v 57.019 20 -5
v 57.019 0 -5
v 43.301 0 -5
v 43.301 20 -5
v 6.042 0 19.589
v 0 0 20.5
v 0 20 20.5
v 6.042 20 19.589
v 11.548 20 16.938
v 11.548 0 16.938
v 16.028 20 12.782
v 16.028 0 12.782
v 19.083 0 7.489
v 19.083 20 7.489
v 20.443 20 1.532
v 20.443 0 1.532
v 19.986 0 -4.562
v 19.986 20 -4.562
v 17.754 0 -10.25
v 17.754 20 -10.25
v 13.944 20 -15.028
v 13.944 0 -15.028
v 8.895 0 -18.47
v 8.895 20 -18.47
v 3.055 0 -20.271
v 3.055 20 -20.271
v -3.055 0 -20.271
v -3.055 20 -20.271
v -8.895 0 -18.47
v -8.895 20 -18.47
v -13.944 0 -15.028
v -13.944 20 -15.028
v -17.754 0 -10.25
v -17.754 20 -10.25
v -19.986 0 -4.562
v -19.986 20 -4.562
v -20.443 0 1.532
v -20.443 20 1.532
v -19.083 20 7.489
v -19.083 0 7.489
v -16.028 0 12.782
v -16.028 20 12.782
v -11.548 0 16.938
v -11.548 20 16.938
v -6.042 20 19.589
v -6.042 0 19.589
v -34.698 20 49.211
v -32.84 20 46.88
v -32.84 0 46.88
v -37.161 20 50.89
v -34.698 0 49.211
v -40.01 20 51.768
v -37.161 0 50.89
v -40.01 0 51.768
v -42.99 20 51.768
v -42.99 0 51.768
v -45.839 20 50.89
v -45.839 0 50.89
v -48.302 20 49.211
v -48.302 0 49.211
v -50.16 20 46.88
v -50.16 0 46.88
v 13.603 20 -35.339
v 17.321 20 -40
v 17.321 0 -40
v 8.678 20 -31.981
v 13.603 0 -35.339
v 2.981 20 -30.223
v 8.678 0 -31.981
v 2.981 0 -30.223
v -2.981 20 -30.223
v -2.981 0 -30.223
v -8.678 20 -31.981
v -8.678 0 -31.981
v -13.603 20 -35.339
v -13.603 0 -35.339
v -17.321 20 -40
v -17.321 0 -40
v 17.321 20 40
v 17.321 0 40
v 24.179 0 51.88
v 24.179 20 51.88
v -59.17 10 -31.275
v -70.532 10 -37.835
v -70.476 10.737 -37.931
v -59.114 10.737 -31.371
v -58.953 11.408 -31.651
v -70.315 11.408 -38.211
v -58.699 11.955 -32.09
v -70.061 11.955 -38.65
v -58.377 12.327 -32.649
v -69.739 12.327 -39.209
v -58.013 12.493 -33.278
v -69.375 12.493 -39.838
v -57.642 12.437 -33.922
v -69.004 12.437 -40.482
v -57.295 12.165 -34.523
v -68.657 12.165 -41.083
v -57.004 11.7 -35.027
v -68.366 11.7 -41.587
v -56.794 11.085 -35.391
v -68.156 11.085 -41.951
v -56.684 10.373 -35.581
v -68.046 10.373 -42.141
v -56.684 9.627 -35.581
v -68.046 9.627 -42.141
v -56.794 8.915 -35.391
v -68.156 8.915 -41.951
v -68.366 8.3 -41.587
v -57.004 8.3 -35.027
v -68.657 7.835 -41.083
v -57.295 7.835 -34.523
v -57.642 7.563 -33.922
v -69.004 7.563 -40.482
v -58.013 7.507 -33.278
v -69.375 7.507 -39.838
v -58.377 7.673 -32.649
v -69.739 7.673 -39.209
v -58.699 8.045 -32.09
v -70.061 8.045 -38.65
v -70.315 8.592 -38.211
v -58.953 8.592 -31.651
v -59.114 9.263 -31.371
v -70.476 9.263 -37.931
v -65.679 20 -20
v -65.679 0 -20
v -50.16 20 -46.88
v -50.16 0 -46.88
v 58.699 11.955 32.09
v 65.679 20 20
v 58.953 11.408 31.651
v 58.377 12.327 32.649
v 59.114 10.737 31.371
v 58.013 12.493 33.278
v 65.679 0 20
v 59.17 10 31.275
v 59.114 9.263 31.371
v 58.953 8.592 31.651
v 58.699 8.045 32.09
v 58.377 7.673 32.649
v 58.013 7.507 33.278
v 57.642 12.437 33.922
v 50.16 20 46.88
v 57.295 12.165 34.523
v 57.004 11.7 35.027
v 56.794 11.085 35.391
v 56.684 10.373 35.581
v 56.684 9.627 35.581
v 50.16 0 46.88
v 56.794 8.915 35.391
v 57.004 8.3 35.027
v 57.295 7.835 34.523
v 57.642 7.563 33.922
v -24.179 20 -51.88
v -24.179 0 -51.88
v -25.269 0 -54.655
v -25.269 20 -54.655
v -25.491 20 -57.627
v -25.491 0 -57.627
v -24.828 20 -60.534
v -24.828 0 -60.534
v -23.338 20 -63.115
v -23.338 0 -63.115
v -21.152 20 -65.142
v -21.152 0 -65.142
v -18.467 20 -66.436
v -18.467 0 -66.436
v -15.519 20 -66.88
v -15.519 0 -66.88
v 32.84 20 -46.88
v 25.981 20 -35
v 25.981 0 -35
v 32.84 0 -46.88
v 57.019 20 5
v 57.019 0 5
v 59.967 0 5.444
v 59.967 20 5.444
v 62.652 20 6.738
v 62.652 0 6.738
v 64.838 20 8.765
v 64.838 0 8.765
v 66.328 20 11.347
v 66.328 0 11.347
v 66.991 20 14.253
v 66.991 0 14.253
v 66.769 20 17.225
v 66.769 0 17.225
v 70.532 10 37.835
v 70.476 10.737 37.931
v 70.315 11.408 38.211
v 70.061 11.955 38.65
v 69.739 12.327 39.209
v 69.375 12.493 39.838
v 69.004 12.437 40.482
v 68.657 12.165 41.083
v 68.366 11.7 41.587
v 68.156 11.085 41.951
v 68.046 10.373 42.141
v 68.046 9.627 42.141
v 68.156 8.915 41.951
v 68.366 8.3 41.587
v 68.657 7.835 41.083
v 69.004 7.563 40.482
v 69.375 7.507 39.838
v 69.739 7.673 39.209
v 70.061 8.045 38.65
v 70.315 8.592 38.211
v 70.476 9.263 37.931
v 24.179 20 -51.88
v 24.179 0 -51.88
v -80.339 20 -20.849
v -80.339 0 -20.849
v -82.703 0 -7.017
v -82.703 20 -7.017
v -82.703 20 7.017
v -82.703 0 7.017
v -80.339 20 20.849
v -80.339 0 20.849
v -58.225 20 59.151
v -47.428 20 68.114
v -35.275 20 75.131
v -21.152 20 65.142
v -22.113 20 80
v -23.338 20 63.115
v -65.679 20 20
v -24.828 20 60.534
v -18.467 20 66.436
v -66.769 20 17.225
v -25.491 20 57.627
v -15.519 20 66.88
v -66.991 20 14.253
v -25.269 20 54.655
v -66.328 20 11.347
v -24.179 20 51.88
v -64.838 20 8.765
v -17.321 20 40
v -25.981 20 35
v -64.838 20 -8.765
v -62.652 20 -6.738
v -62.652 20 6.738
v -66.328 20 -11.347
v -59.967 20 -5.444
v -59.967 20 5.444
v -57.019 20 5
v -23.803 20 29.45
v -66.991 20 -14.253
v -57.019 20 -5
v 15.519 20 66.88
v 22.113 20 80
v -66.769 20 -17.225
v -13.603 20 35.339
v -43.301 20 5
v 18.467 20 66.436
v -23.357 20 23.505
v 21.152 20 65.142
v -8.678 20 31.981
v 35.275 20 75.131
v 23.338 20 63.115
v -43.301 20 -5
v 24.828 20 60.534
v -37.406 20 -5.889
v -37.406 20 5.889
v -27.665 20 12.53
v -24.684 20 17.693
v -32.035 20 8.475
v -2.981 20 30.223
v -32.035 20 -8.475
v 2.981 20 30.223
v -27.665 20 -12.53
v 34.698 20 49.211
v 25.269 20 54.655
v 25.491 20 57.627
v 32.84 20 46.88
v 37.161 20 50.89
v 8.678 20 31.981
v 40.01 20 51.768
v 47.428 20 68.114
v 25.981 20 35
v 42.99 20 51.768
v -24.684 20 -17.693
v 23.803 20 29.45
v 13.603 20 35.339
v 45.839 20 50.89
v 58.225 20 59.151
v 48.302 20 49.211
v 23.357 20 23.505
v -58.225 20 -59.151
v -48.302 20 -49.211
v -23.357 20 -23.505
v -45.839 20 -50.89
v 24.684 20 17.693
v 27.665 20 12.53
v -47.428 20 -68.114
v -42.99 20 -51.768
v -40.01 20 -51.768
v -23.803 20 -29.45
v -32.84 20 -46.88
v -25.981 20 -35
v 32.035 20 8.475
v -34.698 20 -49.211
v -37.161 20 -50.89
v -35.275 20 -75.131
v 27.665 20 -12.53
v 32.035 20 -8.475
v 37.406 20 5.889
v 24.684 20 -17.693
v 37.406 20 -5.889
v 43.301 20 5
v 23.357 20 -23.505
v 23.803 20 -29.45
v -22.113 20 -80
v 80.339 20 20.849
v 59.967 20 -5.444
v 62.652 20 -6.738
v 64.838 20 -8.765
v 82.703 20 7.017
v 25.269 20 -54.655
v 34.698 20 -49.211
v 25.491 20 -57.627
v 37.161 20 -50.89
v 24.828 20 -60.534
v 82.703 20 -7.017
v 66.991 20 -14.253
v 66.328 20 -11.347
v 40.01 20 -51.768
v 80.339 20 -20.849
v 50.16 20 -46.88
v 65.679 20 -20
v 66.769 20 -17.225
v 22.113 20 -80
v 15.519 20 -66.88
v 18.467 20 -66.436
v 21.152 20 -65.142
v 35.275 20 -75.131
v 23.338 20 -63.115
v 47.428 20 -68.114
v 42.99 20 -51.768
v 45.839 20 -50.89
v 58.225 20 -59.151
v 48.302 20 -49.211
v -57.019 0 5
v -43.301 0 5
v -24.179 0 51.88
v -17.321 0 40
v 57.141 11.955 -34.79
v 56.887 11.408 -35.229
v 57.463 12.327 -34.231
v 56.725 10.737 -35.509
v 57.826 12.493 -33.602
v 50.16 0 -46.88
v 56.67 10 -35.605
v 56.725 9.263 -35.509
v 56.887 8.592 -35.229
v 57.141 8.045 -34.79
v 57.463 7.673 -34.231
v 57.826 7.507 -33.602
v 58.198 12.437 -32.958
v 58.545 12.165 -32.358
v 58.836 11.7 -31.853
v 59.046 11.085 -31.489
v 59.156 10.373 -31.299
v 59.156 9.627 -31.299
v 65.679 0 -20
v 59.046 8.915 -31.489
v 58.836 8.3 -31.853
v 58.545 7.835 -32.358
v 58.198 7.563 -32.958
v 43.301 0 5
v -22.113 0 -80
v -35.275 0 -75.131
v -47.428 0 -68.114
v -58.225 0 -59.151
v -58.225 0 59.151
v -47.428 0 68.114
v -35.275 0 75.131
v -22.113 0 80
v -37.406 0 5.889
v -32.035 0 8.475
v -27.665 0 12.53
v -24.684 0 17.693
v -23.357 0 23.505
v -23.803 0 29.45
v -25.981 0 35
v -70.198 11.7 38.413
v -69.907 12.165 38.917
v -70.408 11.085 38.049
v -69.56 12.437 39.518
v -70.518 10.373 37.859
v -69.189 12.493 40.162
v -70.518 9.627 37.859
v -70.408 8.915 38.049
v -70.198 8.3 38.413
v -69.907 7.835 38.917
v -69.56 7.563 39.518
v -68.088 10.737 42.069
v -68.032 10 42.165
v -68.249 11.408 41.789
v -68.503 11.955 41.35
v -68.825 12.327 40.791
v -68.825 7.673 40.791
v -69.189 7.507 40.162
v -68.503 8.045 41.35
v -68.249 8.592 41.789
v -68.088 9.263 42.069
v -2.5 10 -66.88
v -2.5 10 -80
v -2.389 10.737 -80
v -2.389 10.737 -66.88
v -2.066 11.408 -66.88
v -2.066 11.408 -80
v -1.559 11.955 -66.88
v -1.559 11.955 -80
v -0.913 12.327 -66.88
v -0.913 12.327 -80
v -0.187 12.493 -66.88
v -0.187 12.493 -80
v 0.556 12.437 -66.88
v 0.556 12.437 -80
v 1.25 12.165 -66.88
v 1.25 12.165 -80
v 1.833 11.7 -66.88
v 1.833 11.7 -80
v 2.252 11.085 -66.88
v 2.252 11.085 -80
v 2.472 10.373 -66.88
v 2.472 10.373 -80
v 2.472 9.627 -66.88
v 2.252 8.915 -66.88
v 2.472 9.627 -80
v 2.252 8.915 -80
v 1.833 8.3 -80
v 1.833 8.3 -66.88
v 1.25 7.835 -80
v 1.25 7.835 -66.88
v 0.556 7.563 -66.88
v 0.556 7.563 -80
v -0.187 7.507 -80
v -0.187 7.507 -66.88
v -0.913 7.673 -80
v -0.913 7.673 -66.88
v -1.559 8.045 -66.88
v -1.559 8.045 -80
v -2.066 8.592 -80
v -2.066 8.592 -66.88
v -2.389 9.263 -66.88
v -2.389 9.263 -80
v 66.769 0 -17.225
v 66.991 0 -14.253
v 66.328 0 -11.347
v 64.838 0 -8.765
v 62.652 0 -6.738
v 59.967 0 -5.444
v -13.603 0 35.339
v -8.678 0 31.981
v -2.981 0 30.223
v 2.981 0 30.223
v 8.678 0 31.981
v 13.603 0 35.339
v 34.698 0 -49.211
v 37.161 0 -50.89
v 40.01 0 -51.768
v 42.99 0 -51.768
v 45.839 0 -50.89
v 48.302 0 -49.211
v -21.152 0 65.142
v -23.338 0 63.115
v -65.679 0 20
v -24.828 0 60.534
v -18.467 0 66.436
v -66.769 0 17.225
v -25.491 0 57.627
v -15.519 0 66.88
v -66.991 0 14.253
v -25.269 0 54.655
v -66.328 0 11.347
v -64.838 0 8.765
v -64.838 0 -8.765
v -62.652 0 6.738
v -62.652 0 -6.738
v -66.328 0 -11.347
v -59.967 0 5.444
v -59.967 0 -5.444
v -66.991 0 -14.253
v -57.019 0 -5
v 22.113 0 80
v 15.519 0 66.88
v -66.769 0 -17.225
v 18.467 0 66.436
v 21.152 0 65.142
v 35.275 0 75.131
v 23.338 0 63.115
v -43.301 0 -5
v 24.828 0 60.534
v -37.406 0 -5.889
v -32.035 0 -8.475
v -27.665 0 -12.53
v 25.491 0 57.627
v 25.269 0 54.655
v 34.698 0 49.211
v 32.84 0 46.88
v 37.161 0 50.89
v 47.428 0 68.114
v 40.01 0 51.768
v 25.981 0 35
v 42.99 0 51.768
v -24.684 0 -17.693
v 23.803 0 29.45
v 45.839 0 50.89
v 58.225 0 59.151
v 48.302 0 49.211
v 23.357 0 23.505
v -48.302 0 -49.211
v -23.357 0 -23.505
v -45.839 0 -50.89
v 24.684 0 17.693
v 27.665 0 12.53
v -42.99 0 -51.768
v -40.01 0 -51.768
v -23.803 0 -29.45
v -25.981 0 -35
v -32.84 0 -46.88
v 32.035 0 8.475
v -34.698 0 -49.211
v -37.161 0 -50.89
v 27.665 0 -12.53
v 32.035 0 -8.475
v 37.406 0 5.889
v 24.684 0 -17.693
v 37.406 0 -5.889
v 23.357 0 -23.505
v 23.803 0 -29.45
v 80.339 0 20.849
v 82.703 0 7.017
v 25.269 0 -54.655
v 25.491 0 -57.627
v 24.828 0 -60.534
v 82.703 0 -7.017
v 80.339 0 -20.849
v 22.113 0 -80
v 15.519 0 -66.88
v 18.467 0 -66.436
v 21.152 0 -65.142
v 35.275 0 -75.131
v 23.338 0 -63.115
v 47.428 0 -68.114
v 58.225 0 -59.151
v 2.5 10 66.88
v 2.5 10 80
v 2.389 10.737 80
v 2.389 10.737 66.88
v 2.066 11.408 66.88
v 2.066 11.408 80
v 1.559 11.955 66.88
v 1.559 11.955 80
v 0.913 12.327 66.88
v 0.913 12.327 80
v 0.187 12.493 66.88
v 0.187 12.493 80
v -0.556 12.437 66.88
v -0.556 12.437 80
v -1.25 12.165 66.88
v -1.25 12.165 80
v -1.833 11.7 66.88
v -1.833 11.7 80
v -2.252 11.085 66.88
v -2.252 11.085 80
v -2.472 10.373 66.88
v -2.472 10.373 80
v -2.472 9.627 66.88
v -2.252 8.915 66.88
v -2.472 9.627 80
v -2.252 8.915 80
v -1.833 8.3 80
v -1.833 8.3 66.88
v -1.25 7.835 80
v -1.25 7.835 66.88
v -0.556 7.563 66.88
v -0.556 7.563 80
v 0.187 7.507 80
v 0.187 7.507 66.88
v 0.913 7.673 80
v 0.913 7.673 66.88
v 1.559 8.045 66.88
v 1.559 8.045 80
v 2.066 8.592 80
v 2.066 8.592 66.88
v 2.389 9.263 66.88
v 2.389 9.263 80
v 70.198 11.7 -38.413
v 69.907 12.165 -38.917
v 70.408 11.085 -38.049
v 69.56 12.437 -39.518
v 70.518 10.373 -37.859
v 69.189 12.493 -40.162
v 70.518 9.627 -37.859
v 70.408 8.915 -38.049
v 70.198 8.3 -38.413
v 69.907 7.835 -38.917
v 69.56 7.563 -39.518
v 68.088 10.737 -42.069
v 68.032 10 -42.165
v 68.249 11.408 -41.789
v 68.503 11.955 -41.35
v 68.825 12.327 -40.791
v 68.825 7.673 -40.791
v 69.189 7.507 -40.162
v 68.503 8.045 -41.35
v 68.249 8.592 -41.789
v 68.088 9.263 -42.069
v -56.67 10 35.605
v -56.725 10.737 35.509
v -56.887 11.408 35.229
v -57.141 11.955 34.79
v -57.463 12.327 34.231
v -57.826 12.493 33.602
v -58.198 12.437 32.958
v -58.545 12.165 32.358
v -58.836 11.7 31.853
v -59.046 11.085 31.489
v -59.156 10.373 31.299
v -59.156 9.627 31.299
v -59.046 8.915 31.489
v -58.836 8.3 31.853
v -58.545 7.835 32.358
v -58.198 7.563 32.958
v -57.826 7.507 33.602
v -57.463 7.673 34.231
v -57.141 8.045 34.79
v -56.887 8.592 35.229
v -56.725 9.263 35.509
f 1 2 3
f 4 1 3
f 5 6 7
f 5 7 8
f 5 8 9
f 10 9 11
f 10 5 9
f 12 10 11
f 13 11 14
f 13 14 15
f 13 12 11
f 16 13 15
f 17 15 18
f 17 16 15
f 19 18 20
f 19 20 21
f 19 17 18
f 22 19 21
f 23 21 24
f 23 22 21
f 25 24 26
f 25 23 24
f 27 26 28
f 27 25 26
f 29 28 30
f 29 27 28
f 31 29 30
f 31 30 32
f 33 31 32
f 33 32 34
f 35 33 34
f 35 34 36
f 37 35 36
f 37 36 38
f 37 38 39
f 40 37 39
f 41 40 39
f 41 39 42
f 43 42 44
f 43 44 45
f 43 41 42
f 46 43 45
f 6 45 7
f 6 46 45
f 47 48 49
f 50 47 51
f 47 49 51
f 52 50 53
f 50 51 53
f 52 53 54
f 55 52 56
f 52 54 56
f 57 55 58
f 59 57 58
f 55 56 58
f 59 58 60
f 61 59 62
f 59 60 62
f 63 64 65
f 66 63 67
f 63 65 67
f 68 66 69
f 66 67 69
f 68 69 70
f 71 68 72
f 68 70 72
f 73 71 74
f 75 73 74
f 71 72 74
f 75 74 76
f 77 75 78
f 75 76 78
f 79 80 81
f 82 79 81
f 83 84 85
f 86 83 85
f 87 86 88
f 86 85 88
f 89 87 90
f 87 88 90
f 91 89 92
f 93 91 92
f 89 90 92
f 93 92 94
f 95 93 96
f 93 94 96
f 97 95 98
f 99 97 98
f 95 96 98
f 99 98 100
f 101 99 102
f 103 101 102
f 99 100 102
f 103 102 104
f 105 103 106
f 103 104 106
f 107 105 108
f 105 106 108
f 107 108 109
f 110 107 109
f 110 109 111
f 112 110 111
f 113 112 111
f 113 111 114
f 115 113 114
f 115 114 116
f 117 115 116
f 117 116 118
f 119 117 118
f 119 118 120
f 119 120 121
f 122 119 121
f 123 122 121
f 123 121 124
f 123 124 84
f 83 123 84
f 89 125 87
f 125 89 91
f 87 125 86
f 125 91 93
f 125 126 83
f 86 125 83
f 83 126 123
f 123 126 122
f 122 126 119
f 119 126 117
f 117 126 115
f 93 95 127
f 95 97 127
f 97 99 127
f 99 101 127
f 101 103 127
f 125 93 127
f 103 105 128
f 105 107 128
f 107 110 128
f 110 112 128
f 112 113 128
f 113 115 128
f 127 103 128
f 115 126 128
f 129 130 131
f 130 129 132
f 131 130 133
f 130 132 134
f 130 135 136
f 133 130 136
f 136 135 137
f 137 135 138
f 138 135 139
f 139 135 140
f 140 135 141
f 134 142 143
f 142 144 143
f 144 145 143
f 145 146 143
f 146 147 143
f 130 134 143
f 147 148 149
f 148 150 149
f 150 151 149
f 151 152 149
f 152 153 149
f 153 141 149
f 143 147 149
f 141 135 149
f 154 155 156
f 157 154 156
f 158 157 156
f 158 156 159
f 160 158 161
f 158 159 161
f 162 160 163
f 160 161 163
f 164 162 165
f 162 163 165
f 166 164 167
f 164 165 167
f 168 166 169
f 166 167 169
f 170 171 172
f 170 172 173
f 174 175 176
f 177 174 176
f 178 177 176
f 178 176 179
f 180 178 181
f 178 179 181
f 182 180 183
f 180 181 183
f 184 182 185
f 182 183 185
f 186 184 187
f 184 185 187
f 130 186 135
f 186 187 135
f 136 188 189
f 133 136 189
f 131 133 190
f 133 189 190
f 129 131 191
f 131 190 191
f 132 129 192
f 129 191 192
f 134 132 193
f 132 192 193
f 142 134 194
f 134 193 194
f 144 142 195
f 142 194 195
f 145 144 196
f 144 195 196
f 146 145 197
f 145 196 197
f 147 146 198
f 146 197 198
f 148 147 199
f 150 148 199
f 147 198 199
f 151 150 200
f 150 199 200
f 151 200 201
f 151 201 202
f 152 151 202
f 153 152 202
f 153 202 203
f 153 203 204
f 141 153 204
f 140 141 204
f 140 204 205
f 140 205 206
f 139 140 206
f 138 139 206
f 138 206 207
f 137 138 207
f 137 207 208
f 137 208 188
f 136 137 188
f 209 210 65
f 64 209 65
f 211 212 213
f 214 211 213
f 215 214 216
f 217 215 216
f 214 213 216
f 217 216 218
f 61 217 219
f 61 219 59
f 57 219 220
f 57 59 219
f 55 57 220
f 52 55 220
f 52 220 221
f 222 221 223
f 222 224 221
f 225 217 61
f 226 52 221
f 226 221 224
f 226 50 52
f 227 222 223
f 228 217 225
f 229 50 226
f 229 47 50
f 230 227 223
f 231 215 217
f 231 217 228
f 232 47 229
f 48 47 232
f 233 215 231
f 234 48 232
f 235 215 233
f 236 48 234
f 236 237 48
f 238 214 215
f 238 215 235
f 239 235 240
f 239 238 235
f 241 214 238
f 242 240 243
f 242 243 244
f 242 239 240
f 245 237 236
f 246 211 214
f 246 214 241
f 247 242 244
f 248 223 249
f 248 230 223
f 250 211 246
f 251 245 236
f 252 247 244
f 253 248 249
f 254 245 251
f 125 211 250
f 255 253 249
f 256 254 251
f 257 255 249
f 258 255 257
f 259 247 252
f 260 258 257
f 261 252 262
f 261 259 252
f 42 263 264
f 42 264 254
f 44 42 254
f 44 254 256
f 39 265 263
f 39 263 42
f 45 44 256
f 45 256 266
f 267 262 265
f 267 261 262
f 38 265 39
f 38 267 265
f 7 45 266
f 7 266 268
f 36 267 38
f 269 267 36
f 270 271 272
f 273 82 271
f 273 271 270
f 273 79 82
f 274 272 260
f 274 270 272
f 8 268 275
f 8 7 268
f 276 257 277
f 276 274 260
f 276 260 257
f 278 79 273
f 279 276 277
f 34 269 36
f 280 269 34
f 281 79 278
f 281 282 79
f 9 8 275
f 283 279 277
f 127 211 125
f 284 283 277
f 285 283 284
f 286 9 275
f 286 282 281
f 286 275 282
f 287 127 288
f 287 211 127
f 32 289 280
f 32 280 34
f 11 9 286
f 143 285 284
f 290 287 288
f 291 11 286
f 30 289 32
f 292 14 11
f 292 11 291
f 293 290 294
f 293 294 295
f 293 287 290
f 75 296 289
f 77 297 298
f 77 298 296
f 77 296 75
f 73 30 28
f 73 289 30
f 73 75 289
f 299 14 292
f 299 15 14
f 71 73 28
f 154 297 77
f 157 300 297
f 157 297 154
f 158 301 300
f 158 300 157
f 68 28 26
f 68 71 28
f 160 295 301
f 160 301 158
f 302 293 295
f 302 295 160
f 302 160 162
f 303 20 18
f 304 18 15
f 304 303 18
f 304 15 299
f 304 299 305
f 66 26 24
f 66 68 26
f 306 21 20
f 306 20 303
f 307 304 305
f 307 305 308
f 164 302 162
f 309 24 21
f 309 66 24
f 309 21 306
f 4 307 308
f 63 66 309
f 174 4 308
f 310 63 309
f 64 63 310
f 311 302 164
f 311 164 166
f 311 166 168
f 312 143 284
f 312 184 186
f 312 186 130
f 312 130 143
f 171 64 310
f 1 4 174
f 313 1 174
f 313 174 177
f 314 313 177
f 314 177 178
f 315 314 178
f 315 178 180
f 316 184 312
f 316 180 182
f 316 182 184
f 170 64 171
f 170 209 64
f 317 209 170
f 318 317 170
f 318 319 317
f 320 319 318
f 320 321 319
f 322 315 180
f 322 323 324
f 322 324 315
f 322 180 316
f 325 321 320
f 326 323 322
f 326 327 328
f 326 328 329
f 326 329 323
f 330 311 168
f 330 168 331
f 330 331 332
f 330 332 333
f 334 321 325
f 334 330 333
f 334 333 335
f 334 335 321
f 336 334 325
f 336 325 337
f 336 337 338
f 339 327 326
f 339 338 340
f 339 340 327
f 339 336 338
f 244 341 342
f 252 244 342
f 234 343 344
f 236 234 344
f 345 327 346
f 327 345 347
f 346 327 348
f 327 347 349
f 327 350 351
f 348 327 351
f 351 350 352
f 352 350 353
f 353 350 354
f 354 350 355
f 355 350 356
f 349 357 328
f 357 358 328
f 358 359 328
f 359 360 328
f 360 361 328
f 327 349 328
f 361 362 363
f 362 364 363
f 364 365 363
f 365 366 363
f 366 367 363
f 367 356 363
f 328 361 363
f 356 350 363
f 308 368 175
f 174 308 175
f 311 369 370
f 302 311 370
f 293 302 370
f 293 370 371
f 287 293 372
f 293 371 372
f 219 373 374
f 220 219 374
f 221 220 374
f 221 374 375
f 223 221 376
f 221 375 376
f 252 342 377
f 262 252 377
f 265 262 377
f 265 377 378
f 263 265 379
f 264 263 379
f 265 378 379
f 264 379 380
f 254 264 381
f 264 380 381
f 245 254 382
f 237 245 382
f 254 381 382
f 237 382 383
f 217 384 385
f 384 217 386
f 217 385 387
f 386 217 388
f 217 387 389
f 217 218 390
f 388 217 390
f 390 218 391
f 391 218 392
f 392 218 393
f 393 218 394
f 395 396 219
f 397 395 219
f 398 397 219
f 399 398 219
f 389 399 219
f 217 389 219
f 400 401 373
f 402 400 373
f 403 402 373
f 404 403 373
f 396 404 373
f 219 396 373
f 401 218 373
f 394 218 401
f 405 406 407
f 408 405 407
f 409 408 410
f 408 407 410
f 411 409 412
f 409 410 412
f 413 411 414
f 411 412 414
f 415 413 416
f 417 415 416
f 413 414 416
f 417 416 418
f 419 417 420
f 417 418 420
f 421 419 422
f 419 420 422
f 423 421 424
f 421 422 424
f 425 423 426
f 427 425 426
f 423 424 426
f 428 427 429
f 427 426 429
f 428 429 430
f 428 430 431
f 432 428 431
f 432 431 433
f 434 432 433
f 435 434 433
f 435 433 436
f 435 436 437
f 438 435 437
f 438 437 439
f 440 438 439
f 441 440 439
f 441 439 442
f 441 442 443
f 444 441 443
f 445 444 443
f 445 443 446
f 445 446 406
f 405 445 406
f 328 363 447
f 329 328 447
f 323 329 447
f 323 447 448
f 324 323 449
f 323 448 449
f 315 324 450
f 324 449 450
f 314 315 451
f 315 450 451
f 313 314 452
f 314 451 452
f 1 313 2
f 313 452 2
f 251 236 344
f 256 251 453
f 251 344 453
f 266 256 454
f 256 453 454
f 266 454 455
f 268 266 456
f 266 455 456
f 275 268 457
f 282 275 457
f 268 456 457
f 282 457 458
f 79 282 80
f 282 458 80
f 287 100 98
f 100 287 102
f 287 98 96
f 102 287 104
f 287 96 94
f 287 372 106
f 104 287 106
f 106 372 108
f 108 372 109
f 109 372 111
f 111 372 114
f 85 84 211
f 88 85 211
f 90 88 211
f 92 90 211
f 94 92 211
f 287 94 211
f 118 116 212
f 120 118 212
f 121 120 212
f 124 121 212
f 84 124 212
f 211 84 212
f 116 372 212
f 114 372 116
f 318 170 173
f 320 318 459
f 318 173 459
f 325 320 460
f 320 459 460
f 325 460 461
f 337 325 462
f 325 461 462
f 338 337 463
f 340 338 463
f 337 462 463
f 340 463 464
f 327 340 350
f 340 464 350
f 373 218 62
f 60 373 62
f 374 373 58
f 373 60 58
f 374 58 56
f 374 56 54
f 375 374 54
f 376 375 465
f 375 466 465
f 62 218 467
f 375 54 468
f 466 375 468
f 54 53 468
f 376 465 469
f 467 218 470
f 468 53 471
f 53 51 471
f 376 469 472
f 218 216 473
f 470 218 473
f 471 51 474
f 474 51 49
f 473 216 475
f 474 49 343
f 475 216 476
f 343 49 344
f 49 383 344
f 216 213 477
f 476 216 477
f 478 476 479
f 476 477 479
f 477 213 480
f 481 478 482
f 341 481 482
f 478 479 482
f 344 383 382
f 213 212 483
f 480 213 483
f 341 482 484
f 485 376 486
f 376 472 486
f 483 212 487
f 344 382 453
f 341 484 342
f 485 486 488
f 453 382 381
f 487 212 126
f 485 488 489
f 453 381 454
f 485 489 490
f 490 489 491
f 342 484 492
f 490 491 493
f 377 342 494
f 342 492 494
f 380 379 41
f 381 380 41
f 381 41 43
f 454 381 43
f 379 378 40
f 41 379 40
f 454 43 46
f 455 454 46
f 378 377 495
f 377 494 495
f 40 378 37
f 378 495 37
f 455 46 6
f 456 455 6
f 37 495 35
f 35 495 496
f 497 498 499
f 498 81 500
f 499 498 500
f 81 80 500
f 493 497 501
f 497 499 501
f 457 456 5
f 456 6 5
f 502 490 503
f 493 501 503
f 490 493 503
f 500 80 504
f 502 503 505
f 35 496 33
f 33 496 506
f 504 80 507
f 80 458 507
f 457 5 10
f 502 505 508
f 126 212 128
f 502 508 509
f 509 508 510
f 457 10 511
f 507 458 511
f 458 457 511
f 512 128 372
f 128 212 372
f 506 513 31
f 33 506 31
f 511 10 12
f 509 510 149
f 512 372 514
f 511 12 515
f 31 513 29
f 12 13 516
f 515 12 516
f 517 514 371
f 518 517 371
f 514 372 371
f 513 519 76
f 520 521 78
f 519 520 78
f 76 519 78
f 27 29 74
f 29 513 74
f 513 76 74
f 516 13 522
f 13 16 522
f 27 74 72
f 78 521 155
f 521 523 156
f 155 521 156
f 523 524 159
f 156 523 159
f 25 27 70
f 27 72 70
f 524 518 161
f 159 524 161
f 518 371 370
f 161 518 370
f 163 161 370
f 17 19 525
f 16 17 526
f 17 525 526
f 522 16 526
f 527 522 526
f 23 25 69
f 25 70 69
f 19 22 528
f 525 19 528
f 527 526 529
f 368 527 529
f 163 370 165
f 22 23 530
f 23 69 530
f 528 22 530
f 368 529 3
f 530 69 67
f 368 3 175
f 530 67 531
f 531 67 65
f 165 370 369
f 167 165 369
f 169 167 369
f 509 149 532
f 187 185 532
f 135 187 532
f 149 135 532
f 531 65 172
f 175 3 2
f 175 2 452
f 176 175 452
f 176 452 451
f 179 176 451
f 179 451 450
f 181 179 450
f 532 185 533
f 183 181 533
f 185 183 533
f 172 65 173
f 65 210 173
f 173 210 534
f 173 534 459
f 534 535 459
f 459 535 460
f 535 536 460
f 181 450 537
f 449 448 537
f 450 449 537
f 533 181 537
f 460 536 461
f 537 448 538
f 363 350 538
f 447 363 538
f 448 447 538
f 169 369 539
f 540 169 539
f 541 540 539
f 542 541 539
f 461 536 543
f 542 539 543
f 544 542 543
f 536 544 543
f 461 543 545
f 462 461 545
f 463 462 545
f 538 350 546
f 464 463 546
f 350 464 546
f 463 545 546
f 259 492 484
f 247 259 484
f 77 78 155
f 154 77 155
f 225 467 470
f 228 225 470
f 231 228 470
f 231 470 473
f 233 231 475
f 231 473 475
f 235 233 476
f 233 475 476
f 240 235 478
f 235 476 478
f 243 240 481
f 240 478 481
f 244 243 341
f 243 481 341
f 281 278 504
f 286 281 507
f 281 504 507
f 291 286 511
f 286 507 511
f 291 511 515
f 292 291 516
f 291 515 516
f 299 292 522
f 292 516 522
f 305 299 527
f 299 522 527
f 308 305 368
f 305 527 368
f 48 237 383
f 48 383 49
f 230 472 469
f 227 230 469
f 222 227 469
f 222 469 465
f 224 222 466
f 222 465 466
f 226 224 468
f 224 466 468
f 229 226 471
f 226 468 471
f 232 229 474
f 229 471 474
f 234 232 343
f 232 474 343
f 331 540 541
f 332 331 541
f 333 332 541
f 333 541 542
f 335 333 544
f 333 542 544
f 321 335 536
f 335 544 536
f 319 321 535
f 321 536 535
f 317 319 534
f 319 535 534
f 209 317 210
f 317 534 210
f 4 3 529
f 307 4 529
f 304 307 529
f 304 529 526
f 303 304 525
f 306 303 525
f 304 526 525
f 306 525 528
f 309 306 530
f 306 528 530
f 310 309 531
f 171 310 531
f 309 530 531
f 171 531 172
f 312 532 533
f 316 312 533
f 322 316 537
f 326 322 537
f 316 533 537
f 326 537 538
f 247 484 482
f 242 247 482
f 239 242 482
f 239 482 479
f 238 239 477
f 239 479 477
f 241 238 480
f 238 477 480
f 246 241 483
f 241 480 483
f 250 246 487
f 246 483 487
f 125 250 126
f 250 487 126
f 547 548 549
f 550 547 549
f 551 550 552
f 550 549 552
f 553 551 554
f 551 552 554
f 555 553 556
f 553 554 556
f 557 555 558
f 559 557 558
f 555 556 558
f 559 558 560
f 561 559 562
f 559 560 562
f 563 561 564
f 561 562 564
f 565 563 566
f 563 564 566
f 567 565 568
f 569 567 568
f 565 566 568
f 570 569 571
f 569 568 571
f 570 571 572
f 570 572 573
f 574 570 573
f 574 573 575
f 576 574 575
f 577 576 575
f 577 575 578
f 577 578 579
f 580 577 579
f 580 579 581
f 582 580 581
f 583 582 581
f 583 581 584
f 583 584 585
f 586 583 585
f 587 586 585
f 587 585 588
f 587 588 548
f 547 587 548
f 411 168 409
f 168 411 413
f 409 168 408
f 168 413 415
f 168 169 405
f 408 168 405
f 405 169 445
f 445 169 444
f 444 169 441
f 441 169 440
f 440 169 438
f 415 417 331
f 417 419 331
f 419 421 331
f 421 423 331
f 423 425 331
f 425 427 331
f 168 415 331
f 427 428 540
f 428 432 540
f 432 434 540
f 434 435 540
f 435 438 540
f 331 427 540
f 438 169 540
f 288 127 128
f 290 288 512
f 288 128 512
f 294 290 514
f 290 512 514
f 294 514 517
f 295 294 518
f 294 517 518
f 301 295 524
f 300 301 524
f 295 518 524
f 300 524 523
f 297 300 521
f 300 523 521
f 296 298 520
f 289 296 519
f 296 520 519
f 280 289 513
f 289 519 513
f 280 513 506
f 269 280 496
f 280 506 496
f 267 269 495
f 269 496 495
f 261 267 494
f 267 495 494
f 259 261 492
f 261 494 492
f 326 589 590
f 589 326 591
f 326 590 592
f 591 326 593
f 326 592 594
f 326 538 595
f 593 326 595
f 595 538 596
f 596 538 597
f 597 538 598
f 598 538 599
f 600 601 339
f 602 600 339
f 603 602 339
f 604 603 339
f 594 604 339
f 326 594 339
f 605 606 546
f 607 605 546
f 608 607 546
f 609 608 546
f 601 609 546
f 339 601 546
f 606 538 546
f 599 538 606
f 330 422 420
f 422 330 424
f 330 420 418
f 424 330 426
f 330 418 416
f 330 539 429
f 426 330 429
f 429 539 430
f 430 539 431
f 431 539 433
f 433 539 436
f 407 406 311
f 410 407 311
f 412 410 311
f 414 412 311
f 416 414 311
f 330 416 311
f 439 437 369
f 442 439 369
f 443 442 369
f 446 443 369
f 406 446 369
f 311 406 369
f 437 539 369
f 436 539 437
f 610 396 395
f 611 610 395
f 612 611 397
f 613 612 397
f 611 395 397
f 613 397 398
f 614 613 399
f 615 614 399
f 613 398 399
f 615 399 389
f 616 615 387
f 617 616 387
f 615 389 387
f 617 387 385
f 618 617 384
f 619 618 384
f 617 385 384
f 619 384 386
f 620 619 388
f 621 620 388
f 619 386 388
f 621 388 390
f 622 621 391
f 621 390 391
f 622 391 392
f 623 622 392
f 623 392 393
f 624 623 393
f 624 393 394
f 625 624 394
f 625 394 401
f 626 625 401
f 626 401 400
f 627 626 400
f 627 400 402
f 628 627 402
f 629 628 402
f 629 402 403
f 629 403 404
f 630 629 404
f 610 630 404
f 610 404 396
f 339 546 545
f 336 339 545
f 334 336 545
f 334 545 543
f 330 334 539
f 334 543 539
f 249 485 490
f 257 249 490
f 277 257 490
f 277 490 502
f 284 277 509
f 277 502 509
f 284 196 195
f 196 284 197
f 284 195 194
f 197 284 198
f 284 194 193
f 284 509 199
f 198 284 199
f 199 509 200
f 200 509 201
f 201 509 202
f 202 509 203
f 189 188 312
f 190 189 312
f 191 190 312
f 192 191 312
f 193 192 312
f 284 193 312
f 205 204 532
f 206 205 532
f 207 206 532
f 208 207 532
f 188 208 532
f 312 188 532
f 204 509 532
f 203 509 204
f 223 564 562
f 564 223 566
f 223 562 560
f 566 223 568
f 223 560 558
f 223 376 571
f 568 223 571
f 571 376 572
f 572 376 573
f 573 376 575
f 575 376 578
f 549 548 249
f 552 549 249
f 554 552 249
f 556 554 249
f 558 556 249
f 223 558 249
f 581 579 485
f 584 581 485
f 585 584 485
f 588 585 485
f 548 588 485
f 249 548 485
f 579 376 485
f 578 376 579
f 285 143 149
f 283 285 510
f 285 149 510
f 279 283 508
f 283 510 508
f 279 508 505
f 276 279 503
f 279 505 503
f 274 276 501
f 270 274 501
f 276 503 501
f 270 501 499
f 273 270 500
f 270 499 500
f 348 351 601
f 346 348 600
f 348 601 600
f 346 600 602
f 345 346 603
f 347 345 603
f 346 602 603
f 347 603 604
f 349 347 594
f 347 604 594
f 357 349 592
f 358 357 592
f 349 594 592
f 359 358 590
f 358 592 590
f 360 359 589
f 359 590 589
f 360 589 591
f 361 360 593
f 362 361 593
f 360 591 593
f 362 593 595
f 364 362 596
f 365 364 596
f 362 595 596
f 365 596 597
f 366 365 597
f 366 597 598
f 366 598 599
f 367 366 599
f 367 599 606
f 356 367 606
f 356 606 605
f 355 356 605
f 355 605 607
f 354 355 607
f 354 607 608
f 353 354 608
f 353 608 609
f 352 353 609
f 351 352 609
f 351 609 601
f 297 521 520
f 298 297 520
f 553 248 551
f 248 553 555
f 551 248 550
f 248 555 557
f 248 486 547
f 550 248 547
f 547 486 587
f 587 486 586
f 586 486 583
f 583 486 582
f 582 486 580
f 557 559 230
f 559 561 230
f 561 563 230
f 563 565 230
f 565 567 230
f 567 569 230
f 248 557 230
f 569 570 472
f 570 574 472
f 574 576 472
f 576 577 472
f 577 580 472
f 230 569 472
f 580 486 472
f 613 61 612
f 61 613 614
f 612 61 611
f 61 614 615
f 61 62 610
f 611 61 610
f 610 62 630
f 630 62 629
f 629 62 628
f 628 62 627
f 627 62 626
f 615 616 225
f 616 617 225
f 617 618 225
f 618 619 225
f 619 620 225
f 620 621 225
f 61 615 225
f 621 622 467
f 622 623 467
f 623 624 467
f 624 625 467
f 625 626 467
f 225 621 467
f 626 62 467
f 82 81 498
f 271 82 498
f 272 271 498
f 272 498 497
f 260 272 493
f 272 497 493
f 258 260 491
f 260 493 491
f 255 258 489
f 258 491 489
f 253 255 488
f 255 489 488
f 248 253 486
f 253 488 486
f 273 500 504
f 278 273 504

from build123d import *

# Parameters (mm, degrees)
SKETCH2_R           = 20.5
BOSS_EXTRUDE1_DEPTH = 20
SKETCH3_R           = 2.5
CUT_EXTRUDE1_DEPTH  = 20
CIRPATTERN1_COUNT   = 6


with BuildPart() as part:
    # Sketch2 → Boss-Extrude1 (new body)
    with BuildSketch(Plane(origin=(0, 0, 0), x_dir=(1, 0, 0), z_dir=(0, 1, 0))):
        with BuildLine():
            Line((22.113344387, 80), (-22.113344387, 80))
            ThreePointArc((-22.113344387, 80), (-41.5, 71.880108514), (-58.225360109, 59.150718002))
            Line((-58.225360109, 59.150718002), (-80.338704497, 20.849281998))
            ThreePointArc((-80.338704497, 20.849281998), (-83, 0), (-80.338704497, -20.849281998))
            Line((-80.338704497, -20.849281998), (-58.225360109, -59.150718002))
            ThreePointArc((-58.225360109, -59.150718002), (-41.5, -71.880108514), (-22.113344387, -80))
            Line((-22.113344387, -80), (22.113344387, -80))
            ThreePointArc((22.113344387, -80), (41.5, -71.880108514), (58.225360109, -59.150718002))
            Line((58.225360109, -59.150718002), (80.338704497, -20.849281998))
            ThreePointArc((80.338704497, -20.849281998), (83, 0), (80.338704497, 20.849281998))
            Line((80.338704497, 20.849281998), (58.225360109, 59.150718002))
            ThreePointArc((58.225360109, 59.150718002), (41.5, 71.880108514), (22.113344387, 80))
        make_face()
        with Locations(Location((0, 0, 0), (0, 0, 270))):
            Circle(SKETCH2_R, mode=Mode.SUBTRACT)
        with BuildLine():
            Line((-15.519237886, 66.880108514), (15.519237886, 66.880108514))
            ThreePointArc((15.519237886, 66.880108514), (24.179491924, 61.880108514), (24.179491924, 51.880108514))
            Line((24.179491924, 51.880108514), (17.320508076, 40))
            ThreePointArc((17.320508076, 40), (0, 30), (-17.320508076, 40))
            Line((-17.320508076, 40), (-24.179491924, 51.880108514))
            ThreePointArc((-24.179491924, 51.880108514), (-24.179491924, 61.880108514), (-15.519237886, 66.880108514))
        make_face(mode=Mode.SUBTRACT)
        with BuildLine():
            Line((50.160254038, 46.880108514), (65.679491924, 20))
            ThreePointArc((65.679491924, 20), (65.679491924, 10), (57.019237886, 5))
            Line((57.019237886, 5), (43.301270189, 5))
            ThreePointArc((43.301270189, 5), (25.980762114, 15), (25.980762114, 35))
            Line((25.980762114, 35), (32.839745962, 46.880108514))
            ThreePointArc((32.839745962, 46.880108514), (41.5, 51.880108514), (50.160254038, 46.880108514))
        make_face(mode=Mode.SUBTRACT)
        with BuildLine():
            Line((65.679491924, -20), (50.160254038, -46.880108514))
            ThreePointArc((50.160254038, -46.880108514), (41.5, -51.880108514), (32.839745962, -46.880108514))
            Line((32.839745962, -46.880108514), (25.980762114, -35))
            ThreePointArc((25.980762114, -35), (25.980762114, -15), (43.301270189, -5))
            Line((43.301270189, -5), (57.019237886, -5))
            ThreePointArc((57.019237886, -5), (65.679491924, -10), (65.679491924, -20))
        make_face(mode=Mode.SUBTRACT)
        with BuildLine():
            Line((15.519237886, -66.880108514), (-15.519237886, -66.880108514))
            ThreePointArc((-15.519237886, -66.880108514), (-24.179491924, -61.880108514), (-24.179491924, -51.880108514))
            Line((-24.179491924, -51.880108514), (-17.320508076, -40))
            ThreePointArc((-17.320508076, -40), (0, -30), (17.320508076, -40))
            Line((17.320508076, -40), (24.179491924, -51.880108514))
            ThreePointArc((24.179491924, -51.880108514), (24.179491924, -61.880108514), (15.519237886, -66.880108514))
        make_face(mode=Mode.SUBTRACT)
        with BuildLine():
            Line((-50.160254038, -46.880108514), (-65.679491924, -20))
            ThreePointArc((-65.679491924, -20), (-65.679491924, -10), (-57.019237886, -5))
            Line((-57.019237886, -5), (-43.301270189, -5))
            ThreePointArc((-43.301270189, -5), (-25.980762114, -15), (-25.980762114, -35))
            Line((-25.980762114, -35), (-32.839745962, -46.880108514))
            ThreePointArc((-32.839745962, -46.880108514), (-41.5, -51.880108514), (-50.160254038, -46.880108514))
        make_face(mode=Mode.SUBTRACT)
        with BuildLine():
            Line((-65.679491924, 20), (-50.160254038, 46.880108514))
            ThreePointArc((-50.160254038, 46.880108514), (-41.5, 51.880108514), (-32.839745962, 46.880108514))
            Line((-32.839745962, 46.880108514), (-25.980762114, 35))
            ThreePointArc((-25.980762114, 35), (-25.980762114, 15), (-43.301270189, 5))
            Line((-43.301270189, 5), (-57.019237886, 5))
            ThreePointArc((-57.019237886, 5), (-65.679491924, 10), (-65.679491924, 20))
        make_face(mode=Mode.SUBTRACT)
    extrude(amount=BOSS_EXTRUDE1_DEPTH)

    # Sketch3 → Cut-Extrude1 (cut)
    with BuildSketch(Plane.XY.offset(80)):
        with Locations((0, 10)):
            Circle(SKETCH3_R)
    cut_extrude1 = extrude(amount=-CUT_EXTRUDE1_DEPTH, mode=Mode.SUBTRACT)

    # CirPattern1: Cut-Extrude1 ×6 about axis
    cirpattern1_axis = Axis((0, 20, 0), (0, 1, 0))
    for i in range(1, CIRPATTERN1_COUNT):
        add(cut_extrude1.rotate(cirpattern1_axis, i * 360 / CIRPATTERN1_COUNT), mode=Mode.SUBTRACT)


solid = part.part
